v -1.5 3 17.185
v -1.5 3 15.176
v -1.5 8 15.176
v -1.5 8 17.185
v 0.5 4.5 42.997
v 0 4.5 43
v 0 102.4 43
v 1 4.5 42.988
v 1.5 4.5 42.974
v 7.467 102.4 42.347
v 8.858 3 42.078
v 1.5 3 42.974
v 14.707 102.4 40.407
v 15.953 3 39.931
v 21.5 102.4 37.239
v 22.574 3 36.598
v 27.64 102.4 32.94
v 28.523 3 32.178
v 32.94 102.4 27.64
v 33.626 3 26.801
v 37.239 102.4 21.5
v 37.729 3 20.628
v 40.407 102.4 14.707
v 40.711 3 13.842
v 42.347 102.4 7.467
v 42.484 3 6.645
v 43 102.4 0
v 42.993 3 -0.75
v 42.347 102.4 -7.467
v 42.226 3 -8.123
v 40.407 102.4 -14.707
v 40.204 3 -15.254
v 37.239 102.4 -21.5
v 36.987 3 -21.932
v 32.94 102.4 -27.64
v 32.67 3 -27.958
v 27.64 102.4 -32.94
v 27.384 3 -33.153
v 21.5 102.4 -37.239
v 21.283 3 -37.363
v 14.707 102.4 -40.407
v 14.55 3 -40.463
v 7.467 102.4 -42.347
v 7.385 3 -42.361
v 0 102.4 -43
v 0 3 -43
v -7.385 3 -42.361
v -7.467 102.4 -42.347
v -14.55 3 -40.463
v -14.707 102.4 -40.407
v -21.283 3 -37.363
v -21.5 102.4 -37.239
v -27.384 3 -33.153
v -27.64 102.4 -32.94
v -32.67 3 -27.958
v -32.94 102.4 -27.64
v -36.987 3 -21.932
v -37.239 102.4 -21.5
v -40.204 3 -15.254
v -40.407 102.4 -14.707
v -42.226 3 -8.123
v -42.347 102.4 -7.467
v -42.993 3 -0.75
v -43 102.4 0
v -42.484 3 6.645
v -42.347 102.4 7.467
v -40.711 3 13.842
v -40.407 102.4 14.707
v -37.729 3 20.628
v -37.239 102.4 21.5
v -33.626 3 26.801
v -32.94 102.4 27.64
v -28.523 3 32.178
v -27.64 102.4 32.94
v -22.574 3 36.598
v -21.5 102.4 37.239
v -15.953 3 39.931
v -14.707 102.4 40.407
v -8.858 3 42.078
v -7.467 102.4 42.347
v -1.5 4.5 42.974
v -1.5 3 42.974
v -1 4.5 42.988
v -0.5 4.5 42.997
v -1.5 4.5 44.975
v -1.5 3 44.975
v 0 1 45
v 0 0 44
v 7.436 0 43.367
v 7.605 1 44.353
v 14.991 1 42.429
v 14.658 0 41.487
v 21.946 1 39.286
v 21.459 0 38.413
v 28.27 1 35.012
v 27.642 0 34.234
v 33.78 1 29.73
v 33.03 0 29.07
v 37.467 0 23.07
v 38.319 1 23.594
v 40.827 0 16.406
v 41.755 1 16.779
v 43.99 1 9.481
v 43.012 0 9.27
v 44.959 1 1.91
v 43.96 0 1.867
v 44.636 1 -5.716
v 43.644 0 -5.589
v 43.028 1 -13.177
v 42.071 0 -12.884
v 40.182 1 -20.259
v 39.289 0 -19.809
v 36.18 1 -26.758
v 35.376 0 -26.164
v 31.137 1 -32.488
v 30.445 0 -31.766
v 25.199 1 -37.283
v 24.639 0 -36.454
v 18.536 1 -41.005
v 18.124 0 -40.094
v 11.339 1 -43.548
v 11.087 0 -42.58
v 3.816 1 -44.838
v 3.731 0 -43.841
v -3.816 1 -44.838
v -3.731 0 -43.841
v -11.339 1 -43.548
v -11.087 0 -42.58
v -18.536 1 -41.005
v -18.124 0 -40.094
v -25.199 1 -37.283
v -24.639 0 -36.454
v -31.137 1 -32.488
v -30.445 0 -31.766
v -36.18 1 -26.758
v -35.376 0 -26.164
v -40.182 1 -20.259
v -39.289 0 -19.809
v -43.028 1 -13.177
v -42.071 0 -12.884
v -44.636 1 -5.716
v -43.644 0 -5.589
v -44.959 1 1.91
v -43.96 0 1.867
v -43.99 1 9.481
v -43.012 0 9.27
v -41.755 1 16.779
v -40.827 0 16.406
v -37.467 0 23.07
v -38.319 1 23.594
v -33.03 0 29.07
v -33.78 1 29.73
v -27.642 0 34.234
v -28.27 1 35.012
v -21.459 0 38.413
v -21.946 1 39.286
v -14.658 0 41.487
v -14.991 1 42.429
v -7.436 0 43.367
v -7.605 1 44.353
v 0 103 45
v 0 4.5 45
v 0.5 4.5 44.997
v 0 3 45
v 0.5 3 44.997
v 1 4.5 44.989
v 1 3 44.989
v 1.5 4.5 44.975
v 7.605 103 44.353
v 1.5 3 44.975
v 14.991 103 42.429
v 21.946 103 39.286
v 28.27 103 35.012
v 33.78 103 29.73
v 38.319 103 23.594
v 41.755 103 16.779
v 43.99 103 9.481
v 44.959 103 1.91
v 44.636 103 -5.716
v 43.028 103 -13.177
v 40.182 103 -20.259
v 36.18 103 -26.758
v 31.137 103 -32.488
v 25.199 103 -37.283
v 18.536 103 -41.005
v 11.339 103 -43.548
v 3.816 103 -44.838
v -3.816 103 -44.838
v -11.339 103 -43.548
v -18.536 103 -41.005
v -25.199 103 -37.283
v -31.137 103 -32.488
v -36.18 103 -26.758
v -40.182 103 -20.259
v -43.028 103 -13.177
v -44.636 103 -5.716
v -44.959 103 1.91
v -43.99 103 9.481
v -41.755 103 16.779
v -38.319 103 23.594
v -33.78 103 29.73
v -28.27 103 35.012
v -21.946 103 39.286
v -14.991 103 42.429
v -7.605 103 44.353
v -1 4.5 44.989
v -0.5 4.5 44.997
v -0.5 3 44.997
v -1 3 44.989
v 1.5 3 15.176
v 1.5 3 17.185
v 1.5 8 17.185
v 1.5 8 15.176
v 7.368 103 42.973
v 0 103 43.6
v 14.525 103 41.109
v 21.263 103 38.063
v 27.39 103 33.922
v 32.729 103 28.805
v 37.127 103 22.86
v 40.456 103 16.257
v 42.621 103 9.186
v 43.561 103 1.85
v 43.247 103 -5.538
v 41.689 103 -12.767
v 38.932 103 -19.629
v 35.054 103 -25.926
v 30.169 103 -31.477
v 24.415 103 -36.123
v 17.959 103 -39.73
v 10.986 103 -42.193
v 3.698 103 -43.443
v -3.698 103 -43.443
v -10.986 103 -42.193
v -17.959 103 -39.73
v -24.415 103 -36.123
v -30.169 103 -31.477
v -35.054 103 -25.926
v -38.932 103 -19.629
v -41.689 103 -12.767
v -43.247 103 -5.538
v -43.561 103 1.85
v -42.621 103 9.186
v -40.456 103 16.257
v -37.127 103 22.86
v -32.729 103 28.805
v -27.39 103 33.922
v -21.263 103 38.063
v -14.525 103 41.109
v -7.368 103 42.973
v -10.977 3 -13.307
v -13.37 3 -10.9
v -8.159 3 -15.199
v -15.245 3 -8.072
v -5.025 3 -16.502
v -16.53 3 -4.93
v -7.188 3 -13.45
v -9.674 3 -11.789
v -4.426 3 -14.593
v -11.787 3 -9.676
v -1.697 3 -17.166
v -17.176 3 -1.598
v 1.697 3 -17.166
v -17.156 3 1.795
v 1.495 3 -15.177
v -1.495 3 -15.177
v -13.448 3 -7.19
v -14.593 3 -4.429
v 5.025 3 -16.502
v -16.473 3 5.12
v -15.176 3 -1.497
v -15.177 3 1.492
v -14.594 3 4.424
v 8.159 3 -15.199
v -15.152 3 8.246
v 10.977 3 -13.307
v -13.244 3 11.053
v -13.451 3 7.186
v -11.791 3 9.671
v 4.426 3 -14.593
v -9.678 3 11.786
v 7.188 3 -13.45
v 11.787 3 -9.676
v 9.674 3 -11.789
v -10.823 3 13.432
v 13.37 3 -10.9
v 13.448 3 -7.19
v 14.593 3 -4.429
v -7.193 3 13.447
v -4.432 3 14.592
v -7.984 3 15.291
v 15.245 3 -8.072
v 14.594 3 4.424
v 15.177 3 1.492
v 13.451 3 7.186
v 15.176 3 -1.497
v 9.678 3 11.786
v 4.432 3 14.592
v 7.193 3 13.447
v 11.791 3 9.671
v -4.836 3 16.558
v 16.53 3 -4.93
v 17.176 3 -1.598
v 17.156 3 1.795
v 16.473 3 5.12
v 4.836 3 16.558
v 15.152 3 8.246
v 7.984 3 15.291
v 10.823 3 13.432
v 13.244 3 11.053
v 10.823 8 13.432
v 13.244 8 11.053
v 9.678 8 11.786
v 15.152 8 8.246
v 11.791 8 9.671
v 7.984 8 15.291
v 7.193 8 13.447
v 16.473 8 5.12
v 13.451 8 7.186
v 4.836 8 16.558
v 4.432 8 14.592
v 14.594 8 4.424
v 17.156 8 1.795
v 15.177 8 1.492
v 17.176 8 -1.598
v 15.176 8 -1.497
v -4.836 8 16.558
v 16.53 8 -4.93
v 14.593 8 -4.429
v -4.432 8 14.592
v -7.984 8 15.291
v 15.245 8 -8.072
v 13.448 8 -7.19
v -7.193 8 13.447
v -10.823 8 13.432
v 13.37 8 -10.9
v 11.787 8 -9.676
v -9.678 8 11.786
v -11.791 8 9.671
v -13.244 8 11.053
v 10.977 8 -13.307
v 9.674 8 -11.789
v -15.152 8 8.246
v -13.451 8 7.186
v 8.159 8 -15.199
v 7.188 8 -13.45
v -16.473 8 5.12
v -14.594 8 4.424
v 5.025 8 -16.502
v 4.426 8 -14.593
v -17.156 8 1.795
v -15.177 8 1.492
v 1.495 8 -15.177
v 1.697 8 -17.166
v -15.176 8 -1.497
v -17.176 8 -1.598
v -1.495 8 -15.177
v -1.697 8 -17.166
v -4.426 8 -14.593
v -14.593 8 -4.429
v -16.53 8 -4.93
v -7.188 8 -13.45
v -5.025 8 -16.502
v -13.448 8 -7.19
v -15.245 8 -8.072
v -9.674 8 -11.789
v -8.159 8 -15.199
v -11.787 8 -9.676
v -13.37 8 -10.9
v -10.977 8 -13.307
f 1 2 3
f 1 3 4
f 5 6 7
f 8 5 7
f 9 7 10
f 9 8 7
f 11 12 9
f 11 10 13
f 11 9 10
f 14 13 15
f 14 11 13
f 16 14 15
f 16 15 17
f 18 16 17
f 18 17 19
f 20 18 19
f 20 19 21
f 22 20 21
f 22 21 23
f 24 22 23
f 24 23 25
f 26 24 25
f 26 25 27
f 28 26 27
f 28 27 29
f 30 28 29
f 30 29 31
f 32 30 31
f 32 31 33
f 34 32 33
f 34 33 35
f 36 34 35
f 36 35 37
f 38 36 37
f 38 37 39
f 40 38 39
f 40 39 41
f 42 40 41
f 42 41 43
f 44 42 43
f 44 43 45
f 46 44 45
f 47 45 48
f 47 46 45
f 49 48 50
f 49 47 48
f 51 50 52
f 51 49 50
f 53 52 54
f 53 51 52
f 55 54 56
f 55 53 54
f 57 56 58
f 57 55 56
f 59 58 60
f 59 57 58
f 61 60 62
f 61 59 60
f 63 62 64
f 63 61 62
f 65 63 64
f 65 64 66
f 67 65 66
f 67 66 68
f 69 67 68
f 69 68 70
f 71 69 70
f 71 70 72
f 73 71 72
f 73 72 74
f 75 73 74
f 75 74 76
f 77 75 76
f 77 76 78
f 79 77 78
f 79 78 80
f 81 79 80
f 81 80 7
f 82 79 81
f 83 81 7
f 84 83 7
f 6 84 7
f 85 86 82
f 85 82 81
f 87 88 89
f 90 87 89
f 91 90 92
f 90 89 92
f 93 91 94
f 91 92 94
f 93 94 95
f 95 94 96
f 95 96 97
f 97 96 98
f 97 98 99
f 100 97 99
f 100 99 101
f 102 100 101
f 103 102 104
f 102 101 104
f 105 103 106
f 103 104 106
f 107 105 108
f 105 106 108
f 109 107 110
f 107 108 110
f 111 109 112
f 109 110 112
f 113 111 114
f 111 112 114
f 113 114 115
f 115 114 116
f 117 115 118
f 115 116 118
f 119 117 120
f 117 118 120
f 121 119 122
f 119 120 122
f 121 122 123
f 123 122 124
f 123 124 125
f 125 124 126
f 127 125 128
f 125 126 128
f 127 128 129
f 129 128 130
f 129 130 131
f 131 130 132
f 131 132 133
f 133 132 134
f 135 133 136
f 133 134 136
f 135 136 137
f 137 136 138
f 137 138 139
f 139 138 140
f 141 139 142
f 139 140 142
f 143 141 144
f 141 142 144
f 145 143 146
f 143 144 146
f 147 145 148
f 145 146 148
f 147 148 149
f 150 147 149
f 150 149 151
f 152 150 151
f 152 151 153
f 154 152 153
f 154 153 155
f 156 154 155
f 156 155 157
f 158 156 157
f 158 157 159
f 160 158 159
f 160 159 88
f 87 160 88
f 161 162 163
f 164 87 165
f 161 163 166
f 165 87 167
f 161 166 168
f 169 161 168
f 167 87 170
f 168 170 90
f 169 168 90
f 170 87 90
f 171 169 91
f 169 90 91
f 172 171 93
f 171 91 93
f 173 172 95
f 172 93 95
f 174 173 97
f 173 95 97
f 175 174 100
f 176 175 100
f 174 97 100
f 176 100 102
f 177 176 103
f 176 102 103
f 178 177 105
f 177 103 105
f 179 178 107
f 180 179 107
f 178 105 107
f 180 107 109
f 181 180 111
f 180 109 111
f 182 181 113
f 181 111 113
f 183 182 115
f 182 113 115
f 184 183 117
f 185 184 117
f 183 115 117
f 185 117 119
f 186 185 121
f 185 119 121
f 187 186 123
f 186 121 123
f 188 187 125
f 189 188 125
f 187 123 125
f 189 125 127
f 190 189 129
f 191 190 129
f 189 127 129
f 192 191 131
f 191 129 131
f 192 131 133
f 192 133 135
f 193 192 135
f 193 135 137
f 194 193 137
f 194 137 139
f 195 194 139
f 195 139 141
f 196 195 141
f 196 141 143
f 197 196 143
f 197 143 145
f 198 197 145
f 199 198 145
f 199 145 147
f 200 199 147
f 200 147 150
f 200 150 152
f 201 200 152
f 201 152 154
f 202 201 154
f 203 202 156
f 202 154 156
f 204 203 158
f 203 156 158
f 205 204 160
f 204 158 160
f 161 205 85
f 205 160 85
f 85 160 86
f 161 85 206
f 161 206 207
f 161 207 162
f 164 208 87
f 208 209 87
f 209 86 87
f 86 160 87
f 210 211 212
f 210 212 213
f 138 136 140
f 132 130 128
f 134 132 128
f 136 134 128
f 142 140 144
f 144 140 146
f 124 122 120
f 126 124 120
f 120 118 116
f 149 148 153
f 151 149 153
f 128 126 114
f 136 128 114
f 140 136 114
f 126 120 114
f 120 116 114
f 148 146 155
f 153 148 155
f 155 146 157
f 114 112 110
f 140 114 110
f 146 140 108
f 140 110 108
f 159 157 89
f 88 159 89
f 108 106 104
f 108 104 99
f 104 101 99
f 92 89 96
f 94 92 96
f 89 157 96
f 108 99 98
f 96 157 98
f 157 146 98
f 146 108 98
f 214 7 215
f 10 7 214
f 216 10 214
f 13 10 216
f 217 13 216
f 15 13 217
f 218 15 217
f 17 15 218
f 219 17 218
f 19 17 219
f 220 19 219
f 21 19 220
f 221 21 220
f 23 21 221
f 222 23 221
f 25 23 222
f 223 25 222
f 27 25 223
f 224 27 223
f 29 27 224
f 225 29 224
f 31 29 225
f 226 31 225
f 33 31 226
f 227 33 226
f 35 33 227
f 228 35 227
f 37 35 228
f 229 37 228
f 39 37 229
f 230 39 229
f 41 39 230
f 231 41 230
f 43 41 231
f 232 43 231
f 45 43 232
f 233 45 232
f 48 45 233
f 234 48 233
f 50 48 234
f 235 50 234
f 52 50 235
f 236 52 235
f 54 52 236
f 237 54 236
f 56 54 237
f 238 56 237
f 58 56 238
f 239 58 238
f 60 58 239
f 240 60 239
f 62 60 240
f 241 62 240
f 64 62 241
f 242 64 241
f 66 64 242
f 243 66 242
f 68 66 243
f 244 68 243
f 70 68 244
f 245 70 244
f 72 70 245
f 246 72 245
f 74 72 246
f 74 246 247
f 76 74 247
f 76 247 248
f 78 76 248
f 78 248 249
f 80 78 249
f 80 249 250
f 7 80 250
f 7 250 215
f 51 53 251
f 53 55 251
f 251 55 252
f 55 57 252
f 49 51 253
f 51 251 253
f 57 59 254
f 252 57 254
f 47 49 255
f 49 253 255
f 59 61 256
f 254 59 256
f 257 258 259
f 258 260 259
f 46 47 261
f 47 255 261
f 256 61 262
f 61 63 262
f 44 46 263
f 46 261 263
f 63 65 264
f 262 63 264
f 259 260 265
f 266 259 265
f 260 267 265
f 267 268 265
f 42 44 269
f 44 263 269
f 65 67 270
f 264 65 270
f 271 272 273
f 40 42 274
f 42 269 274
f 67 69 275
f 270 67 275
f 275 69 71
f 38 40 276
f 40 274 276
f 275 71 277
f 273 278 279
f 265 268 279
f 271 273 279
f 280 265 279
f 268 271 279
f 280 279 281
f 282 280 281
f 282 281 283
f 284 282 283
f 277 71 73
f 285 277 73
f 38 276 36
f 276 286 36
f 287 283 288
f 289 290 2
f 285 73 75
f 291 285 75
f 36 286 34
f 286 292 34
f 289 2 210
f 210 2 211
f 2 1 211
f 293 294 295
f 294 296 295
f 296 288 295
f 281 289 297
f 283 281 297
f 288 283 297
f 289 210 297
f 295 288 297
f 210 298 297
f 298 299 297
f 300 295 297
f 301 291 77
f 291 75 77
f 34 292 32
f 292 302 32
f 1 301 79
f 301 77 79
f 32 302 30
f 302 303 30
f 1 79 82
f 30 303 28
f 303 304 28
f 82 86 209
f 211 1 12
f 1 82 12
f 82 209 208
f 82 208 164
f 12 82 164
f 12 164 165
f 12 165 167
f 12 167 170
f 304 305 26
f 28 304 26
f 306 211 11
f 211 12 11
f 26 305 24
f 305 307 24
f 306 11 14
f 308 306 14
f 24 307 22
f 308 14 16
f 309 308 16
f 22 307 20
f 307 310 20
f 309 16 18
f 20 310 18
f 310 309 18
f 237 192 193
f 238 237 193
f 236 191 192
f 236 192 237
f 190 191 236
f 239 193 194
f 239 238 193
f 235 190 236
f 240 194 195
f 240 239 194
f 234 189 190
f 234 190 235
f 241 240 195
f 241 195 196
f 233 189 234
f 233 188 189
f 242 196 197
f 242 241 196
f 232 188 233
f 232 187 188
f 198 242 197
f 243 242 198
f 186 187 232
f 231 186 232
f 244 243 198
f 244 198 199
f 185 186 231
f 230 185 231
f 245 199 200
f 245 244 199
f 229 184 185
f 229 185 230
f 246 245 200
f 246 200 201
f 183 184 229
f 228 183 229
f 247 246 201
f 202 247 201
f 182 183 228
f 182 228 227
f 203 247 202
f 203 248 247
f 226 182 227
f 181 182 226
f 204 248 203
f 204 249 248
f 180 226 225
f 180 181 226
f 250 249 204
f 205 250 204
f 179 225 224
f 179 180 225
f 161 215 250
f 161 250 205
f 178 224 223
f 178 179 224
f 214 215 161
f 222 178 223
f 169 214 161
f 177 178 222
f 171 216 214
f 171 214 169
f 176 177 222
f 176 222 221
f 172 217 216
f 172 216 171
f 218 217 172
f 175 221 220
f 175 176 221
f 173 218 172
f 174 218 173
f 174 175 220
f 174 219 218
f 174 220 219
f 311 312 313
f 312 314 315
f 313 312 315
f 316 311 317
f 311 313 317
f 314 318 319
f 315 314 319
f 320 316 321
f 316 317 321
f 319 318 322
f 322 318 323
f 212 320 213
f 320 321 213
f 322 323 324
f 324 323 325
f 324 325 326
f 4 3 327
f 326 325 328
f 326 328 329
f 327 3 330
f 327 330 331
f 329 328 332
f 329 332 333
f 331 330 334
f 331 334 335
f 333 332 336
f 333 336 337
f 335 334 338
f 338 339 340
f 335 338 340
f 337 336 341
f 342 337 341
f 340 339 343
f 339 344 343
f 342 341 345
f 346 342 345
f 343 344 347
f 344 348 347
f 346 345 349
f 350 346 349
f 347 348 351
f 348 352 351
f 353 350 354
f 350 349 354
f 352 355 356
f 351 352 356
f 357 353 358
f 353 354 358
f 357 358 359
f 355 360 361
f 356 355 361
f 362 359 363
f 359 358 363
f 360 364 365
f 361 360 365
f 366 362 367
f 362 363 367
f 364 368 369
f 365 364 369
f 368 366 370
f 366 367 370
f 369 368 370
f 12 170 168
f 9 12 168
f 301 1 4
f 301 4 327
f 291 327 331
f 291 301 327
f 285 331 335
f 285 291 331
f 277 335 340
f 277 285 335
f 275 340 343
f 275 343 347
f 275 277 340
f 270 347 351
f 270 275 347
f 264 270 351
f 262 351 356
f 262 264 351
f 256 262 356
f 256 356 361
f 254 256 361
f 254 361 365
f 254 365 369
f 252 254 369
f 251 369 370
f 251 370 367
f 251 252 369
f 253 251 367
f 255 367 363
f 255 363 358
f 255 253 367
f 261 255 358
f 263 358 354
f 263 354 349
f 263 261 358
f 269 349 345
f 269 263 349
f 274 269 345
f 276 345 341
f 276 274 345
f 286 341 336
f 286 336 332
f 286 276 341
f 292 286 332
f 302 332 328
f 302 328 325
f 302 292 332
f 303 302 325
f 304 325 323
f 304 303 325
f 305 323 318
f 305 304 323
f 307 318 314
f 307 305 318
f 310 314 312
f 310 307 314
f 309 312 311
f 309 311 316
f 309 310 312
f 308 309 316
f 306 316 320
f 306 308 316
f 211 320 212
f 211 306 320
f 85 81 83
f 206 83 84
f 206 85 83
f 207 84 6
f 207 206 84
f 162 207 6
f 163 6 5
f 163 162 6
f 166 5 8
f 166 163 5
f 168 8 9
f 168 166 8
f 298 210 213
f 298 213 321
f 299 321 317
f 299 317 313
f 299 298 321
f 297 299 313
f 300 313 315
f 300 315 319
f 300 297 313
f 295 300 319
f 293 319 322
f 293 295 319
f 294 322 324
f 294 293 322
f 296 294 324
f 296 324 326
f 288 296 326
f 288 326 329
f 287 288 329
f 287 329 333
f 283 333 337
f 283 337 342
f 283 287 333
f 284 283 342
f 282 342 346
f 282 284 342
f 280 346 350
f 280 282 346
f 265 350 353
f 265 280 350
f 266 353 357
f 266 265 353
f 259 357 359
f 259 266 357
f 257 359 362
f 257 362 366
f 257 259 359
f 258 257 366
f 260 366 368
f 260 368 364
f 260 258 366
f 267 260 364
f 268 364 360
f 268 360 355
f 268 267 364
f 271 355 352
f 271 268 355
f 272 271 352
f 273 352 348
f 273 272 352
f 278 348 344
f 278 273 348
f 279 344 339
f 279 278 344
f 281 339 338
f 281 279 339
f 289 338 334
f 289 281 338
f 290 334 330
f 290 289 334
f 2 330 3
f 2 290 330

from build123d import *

# Parameters (mm, degrees)
SKETCH1_R           = 45
BOSS_EXTRUDE1_DEPTH = 3
SKETCH2_R           = 45
SKETCH2_R_2         = 43
BOSS_EXTRUDE2_DEPTH = 100
BOSS_EXTRUDE3_DEPTH = 5
SKETCH4_W           = 3
SKETCH4_H           = 1.5
CUT_EXTRUDE1_DEPTH  = 5
CHAMFER1_SIZE       = 0.6
CHAMFER2_SIZE       = 1


with BuildPart() as part:
    # Sketch1 → Boss-Extrude1 (new body)
    with BuildSketch(Plane(origin=(0, 0, 0), x_dir=(1, 0, 0), z_dir=(0, 1, 0))):
        with Locations(Location((0, 0, 0), (0, 0, 270))):
            Circle(SKETCH1_R)
    extrude(amount=BOSS_EXTRUDE1_DEPTH)

    # Sketch2 → Boss-Extrude2 (add)
    with BuildSketch(Plane(origin=(0, 3, 0), x_dir=(1, 0, 0), z_dir=(0, 1, 0))):
        with Locations(Location((0, 0, 0), (0, 0, 270))):
            Circle(SKETCH2_R)
        with Locations(Location((0, 0, 0), (0, 0, 270))):
            Circle(SKETCH2_R_2, mode=Mode.SUBTRACT)
    extrude(amount=BOSS_EXTRUDE2_DEPTH)

    # Sketch3 → Boss-Extrude3 (add)
    with BuildSketch(Plane(origin=(0, 3, 0), x_dir=(1, 0, 0), z_dir=(0, 1, 0))):
        with BuildLine():
            Line((-1.5, -15.176050211), (-1.5, -17.184658856))
            ThreePointArc((-1.5, -17.184658856), (0, 17.25), (1.5, -17.184658856))
            Line((1.5, -17.184658856), (1.5, -15.176050211))
            ThreePointArc((1.5, -15.176050211), (0, 15.25), (-1.5, -15.176050211))
        make_face()
    extrude(amount=BOSS_EXTRUDE3_DEPTH)

    # Sketch4 → Cut-Extrude1 (cut)
    with BuildSketch(Plane.XY.offset(45)):
        with Locations((0, 3.75)):
            Rectangle(SKETCH4_W, SKETCH4_H)
    extrude(amount=-CUT_EXTRUDE1_DEPTH, mode=Mode.SUBTRACT)

    # Chamfer1
    chamfer1_edges = [part.edges().sort_by_distance(p)[0] for p in [
        (0, 103, -43),
    ]]
    chamfer(chamfer1_edges, length=CHAMFER1_SIZE)

    # Chamfer2
    chamfer2_edges = [part.edges().sort_by_distance(p)[0] for p in [
        (0, 0, -45),
    ]]
    chamfer(chamfer2_edges, length=CHAMFER2_SIZE)


solid = part.part
